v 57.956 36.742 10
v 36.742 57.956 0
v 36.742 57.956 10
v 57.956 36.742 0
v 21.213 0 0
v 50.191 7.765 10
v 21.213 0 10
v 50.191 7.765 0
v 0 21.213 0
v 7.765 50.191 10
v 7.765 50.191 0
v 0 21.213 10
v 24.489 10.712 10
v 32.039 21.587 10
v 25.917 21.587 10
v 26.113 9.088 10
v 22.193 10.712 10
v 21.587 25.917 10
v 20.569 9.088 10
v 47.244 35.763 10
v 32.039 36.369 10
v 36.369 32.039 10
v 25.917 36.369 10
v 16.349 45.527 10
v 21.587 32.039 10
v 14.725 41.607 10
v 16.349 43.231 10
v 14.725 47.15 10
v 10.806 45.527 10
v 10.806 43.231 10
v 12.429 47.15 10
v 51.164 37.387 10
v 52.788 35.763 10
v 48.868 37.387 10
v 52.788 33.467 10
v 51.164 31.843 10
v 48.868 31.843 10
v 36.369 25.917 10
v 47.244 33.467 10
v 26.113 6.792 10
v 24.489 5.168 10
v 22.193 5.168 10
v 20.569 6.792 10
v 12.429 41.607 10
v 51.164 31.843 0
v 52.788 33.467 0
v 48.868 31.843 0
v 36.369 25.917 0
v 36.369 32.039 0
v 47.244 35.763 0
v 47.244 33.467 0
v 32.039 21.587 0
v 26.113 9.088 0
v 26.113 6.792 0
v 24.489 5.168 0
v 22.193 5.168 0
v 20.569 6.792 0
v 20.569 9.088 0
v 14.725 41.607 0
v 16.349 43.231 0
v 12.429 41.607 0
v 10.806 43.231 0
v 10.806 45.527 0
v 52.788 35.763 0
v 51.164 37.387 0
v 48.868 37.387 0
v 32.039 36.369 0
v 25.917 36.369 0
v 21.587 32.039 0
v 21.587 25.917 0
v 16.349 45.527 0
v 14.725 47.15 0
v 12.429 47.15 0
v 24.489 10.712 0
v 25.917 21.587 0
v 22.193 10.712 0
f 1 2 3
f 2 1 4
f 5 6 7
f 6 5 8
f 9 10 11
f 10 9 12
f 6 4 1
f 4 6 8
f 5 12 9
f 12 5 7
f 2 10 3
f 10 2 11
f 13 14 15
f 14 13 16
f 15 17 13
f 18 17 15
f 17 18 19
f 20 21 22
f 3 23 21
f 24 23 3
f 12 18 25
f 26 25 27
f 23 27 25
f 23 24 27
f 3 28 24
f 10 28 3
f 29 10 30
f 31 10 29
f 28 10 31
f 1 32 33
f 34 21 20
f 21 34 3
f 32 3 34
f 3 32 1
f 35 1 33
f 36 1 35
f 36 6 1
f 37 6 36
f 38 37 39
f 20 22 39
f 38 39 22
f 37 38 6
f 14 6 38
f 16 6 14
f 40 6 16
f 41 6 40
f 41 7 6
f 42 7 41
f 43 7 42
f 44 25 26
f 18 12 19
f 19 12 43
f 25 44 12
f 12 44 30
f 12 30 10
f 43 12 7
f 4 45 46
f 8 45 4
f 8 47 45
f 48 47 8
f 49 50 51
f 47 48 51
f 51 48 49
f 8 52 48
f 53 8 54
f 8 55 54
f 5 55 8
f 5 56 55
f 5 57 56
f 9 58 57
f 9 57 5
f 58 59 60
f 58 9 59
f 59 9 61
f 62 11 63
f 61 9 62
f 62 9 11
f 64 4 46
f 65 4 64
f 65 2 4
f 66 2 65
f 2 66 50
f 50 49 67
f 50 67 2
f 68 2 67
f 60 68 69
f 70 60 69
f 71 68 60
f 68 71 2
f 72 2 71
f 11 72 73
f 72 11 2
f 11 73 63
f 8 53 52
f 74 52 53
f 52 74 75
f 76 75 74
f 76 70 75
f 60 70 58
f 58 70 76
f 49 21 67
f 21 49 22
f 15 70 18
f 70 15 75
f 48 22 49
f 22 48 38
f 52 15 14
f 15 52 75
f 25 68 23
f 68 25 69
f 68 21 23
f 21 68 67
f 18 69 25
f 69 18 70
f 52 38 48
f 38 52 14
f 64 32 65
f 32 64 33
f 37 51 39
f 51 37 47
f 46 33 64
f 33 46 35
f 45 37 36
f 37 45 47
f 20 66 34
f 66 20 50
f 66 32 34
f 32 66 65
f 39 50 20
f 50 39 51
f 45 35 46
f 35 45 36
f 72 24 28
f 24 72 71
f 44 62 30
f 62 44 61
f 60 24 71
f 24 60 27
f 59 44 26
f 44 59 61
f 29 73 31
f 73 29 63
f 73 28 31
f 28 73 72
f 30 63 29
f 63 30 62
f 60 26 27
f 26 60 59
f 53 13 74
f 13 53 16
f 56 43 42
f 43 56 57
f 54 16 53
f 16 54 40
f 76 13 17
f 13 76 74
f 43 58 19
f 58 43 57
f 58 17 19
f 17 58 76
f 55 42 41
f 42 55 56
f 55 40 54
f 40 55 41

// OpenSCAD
$fn = 32;

// ----------------------------------------------------------------------
// Polygon plate: 6-gon R30, 3 bolt windows
// ----------------------------------------------------------------------

// --- parameters (mm) ---
sides = 6;                // number of polygon sides
plate_r = 30;             // circumscribed radius of the polygon
bore_r = 8;               // centre bore radius
bolts = 3;                // number of bolt windows
ring_r = 21.78;           // bolt-circle radius
bolt_r = 3;               // bolt window radius
plate_t = 10;             // plate thickness, Z (extrusion height)

plate_d = 2 * plate_r;  // circumscribed diameter
bore_d = 2 * bore_r;  // centre bore diameter
bolt_d = 2 * bolt_r;  // bolt window diameter
ring_d = 2 * ring_r;  // bolt-circle diameter

profile = [[57.956, 36.742], [36.742, 57.956], [7.765, 50.191], [0, 21.213], [21.213, 0], [50.191, 7.765]];  // primary outline, 6 points, counter clockwise
void_1 = [[36.369, 32.039], [32.039, 36.369], [25.917, 36.369], [21.587, 32.039], [21.587, 25.917], [25.917, 21.587], [32.039, 21.587], [36.369, 25.917]];  // centre bore, 8 points
void_2 = [[52.788, 35.763], [51.164, 37.387], [48.868, 37.387], [47.244, 35.763], [47.244, 33.467], [48.868, 31.843], [51.164, 31.843], [52.788, 33.467]];  // bolt window 1, 8 points
void_3 = [[16.349, 45.527], [14.725, 47.15], [12.429, 47.15], [10.806, 45.527], [10.806, 43.231], [12.429, 41.607], [14.725, 41.607], [16.349, 43.231]];  // bolt window 2, 8 points
void_4 = [[26.113, 9.088], [24.489, 10.712], [22.193, 10.712], [20.569, 9.088], [20.569, 6.792], [22.193, 5.168], [24.489, 5.168], [26.113, 6.792]];  // bolt window 3, 8 points

// --- the one profile operation ---
difference() {
  linear_extrude(height = plate_t) polygon(points = profile);
  translate([0, 0, -1])
    linear_extrude(height = plate_t + 2) polygon(points = void_1);
  translate([0, 0, -1])
    linear_extrude(height = plate_t + 2) polygon(points = void_2);
  translate([0, 0, -1])
    linear_extrude(height = plate_t + 2) polygon(points = void_3);
  translate([0, 0, -1])
    linear_extrude(height = plate_t + 2) polygon(points = void_4);
}
